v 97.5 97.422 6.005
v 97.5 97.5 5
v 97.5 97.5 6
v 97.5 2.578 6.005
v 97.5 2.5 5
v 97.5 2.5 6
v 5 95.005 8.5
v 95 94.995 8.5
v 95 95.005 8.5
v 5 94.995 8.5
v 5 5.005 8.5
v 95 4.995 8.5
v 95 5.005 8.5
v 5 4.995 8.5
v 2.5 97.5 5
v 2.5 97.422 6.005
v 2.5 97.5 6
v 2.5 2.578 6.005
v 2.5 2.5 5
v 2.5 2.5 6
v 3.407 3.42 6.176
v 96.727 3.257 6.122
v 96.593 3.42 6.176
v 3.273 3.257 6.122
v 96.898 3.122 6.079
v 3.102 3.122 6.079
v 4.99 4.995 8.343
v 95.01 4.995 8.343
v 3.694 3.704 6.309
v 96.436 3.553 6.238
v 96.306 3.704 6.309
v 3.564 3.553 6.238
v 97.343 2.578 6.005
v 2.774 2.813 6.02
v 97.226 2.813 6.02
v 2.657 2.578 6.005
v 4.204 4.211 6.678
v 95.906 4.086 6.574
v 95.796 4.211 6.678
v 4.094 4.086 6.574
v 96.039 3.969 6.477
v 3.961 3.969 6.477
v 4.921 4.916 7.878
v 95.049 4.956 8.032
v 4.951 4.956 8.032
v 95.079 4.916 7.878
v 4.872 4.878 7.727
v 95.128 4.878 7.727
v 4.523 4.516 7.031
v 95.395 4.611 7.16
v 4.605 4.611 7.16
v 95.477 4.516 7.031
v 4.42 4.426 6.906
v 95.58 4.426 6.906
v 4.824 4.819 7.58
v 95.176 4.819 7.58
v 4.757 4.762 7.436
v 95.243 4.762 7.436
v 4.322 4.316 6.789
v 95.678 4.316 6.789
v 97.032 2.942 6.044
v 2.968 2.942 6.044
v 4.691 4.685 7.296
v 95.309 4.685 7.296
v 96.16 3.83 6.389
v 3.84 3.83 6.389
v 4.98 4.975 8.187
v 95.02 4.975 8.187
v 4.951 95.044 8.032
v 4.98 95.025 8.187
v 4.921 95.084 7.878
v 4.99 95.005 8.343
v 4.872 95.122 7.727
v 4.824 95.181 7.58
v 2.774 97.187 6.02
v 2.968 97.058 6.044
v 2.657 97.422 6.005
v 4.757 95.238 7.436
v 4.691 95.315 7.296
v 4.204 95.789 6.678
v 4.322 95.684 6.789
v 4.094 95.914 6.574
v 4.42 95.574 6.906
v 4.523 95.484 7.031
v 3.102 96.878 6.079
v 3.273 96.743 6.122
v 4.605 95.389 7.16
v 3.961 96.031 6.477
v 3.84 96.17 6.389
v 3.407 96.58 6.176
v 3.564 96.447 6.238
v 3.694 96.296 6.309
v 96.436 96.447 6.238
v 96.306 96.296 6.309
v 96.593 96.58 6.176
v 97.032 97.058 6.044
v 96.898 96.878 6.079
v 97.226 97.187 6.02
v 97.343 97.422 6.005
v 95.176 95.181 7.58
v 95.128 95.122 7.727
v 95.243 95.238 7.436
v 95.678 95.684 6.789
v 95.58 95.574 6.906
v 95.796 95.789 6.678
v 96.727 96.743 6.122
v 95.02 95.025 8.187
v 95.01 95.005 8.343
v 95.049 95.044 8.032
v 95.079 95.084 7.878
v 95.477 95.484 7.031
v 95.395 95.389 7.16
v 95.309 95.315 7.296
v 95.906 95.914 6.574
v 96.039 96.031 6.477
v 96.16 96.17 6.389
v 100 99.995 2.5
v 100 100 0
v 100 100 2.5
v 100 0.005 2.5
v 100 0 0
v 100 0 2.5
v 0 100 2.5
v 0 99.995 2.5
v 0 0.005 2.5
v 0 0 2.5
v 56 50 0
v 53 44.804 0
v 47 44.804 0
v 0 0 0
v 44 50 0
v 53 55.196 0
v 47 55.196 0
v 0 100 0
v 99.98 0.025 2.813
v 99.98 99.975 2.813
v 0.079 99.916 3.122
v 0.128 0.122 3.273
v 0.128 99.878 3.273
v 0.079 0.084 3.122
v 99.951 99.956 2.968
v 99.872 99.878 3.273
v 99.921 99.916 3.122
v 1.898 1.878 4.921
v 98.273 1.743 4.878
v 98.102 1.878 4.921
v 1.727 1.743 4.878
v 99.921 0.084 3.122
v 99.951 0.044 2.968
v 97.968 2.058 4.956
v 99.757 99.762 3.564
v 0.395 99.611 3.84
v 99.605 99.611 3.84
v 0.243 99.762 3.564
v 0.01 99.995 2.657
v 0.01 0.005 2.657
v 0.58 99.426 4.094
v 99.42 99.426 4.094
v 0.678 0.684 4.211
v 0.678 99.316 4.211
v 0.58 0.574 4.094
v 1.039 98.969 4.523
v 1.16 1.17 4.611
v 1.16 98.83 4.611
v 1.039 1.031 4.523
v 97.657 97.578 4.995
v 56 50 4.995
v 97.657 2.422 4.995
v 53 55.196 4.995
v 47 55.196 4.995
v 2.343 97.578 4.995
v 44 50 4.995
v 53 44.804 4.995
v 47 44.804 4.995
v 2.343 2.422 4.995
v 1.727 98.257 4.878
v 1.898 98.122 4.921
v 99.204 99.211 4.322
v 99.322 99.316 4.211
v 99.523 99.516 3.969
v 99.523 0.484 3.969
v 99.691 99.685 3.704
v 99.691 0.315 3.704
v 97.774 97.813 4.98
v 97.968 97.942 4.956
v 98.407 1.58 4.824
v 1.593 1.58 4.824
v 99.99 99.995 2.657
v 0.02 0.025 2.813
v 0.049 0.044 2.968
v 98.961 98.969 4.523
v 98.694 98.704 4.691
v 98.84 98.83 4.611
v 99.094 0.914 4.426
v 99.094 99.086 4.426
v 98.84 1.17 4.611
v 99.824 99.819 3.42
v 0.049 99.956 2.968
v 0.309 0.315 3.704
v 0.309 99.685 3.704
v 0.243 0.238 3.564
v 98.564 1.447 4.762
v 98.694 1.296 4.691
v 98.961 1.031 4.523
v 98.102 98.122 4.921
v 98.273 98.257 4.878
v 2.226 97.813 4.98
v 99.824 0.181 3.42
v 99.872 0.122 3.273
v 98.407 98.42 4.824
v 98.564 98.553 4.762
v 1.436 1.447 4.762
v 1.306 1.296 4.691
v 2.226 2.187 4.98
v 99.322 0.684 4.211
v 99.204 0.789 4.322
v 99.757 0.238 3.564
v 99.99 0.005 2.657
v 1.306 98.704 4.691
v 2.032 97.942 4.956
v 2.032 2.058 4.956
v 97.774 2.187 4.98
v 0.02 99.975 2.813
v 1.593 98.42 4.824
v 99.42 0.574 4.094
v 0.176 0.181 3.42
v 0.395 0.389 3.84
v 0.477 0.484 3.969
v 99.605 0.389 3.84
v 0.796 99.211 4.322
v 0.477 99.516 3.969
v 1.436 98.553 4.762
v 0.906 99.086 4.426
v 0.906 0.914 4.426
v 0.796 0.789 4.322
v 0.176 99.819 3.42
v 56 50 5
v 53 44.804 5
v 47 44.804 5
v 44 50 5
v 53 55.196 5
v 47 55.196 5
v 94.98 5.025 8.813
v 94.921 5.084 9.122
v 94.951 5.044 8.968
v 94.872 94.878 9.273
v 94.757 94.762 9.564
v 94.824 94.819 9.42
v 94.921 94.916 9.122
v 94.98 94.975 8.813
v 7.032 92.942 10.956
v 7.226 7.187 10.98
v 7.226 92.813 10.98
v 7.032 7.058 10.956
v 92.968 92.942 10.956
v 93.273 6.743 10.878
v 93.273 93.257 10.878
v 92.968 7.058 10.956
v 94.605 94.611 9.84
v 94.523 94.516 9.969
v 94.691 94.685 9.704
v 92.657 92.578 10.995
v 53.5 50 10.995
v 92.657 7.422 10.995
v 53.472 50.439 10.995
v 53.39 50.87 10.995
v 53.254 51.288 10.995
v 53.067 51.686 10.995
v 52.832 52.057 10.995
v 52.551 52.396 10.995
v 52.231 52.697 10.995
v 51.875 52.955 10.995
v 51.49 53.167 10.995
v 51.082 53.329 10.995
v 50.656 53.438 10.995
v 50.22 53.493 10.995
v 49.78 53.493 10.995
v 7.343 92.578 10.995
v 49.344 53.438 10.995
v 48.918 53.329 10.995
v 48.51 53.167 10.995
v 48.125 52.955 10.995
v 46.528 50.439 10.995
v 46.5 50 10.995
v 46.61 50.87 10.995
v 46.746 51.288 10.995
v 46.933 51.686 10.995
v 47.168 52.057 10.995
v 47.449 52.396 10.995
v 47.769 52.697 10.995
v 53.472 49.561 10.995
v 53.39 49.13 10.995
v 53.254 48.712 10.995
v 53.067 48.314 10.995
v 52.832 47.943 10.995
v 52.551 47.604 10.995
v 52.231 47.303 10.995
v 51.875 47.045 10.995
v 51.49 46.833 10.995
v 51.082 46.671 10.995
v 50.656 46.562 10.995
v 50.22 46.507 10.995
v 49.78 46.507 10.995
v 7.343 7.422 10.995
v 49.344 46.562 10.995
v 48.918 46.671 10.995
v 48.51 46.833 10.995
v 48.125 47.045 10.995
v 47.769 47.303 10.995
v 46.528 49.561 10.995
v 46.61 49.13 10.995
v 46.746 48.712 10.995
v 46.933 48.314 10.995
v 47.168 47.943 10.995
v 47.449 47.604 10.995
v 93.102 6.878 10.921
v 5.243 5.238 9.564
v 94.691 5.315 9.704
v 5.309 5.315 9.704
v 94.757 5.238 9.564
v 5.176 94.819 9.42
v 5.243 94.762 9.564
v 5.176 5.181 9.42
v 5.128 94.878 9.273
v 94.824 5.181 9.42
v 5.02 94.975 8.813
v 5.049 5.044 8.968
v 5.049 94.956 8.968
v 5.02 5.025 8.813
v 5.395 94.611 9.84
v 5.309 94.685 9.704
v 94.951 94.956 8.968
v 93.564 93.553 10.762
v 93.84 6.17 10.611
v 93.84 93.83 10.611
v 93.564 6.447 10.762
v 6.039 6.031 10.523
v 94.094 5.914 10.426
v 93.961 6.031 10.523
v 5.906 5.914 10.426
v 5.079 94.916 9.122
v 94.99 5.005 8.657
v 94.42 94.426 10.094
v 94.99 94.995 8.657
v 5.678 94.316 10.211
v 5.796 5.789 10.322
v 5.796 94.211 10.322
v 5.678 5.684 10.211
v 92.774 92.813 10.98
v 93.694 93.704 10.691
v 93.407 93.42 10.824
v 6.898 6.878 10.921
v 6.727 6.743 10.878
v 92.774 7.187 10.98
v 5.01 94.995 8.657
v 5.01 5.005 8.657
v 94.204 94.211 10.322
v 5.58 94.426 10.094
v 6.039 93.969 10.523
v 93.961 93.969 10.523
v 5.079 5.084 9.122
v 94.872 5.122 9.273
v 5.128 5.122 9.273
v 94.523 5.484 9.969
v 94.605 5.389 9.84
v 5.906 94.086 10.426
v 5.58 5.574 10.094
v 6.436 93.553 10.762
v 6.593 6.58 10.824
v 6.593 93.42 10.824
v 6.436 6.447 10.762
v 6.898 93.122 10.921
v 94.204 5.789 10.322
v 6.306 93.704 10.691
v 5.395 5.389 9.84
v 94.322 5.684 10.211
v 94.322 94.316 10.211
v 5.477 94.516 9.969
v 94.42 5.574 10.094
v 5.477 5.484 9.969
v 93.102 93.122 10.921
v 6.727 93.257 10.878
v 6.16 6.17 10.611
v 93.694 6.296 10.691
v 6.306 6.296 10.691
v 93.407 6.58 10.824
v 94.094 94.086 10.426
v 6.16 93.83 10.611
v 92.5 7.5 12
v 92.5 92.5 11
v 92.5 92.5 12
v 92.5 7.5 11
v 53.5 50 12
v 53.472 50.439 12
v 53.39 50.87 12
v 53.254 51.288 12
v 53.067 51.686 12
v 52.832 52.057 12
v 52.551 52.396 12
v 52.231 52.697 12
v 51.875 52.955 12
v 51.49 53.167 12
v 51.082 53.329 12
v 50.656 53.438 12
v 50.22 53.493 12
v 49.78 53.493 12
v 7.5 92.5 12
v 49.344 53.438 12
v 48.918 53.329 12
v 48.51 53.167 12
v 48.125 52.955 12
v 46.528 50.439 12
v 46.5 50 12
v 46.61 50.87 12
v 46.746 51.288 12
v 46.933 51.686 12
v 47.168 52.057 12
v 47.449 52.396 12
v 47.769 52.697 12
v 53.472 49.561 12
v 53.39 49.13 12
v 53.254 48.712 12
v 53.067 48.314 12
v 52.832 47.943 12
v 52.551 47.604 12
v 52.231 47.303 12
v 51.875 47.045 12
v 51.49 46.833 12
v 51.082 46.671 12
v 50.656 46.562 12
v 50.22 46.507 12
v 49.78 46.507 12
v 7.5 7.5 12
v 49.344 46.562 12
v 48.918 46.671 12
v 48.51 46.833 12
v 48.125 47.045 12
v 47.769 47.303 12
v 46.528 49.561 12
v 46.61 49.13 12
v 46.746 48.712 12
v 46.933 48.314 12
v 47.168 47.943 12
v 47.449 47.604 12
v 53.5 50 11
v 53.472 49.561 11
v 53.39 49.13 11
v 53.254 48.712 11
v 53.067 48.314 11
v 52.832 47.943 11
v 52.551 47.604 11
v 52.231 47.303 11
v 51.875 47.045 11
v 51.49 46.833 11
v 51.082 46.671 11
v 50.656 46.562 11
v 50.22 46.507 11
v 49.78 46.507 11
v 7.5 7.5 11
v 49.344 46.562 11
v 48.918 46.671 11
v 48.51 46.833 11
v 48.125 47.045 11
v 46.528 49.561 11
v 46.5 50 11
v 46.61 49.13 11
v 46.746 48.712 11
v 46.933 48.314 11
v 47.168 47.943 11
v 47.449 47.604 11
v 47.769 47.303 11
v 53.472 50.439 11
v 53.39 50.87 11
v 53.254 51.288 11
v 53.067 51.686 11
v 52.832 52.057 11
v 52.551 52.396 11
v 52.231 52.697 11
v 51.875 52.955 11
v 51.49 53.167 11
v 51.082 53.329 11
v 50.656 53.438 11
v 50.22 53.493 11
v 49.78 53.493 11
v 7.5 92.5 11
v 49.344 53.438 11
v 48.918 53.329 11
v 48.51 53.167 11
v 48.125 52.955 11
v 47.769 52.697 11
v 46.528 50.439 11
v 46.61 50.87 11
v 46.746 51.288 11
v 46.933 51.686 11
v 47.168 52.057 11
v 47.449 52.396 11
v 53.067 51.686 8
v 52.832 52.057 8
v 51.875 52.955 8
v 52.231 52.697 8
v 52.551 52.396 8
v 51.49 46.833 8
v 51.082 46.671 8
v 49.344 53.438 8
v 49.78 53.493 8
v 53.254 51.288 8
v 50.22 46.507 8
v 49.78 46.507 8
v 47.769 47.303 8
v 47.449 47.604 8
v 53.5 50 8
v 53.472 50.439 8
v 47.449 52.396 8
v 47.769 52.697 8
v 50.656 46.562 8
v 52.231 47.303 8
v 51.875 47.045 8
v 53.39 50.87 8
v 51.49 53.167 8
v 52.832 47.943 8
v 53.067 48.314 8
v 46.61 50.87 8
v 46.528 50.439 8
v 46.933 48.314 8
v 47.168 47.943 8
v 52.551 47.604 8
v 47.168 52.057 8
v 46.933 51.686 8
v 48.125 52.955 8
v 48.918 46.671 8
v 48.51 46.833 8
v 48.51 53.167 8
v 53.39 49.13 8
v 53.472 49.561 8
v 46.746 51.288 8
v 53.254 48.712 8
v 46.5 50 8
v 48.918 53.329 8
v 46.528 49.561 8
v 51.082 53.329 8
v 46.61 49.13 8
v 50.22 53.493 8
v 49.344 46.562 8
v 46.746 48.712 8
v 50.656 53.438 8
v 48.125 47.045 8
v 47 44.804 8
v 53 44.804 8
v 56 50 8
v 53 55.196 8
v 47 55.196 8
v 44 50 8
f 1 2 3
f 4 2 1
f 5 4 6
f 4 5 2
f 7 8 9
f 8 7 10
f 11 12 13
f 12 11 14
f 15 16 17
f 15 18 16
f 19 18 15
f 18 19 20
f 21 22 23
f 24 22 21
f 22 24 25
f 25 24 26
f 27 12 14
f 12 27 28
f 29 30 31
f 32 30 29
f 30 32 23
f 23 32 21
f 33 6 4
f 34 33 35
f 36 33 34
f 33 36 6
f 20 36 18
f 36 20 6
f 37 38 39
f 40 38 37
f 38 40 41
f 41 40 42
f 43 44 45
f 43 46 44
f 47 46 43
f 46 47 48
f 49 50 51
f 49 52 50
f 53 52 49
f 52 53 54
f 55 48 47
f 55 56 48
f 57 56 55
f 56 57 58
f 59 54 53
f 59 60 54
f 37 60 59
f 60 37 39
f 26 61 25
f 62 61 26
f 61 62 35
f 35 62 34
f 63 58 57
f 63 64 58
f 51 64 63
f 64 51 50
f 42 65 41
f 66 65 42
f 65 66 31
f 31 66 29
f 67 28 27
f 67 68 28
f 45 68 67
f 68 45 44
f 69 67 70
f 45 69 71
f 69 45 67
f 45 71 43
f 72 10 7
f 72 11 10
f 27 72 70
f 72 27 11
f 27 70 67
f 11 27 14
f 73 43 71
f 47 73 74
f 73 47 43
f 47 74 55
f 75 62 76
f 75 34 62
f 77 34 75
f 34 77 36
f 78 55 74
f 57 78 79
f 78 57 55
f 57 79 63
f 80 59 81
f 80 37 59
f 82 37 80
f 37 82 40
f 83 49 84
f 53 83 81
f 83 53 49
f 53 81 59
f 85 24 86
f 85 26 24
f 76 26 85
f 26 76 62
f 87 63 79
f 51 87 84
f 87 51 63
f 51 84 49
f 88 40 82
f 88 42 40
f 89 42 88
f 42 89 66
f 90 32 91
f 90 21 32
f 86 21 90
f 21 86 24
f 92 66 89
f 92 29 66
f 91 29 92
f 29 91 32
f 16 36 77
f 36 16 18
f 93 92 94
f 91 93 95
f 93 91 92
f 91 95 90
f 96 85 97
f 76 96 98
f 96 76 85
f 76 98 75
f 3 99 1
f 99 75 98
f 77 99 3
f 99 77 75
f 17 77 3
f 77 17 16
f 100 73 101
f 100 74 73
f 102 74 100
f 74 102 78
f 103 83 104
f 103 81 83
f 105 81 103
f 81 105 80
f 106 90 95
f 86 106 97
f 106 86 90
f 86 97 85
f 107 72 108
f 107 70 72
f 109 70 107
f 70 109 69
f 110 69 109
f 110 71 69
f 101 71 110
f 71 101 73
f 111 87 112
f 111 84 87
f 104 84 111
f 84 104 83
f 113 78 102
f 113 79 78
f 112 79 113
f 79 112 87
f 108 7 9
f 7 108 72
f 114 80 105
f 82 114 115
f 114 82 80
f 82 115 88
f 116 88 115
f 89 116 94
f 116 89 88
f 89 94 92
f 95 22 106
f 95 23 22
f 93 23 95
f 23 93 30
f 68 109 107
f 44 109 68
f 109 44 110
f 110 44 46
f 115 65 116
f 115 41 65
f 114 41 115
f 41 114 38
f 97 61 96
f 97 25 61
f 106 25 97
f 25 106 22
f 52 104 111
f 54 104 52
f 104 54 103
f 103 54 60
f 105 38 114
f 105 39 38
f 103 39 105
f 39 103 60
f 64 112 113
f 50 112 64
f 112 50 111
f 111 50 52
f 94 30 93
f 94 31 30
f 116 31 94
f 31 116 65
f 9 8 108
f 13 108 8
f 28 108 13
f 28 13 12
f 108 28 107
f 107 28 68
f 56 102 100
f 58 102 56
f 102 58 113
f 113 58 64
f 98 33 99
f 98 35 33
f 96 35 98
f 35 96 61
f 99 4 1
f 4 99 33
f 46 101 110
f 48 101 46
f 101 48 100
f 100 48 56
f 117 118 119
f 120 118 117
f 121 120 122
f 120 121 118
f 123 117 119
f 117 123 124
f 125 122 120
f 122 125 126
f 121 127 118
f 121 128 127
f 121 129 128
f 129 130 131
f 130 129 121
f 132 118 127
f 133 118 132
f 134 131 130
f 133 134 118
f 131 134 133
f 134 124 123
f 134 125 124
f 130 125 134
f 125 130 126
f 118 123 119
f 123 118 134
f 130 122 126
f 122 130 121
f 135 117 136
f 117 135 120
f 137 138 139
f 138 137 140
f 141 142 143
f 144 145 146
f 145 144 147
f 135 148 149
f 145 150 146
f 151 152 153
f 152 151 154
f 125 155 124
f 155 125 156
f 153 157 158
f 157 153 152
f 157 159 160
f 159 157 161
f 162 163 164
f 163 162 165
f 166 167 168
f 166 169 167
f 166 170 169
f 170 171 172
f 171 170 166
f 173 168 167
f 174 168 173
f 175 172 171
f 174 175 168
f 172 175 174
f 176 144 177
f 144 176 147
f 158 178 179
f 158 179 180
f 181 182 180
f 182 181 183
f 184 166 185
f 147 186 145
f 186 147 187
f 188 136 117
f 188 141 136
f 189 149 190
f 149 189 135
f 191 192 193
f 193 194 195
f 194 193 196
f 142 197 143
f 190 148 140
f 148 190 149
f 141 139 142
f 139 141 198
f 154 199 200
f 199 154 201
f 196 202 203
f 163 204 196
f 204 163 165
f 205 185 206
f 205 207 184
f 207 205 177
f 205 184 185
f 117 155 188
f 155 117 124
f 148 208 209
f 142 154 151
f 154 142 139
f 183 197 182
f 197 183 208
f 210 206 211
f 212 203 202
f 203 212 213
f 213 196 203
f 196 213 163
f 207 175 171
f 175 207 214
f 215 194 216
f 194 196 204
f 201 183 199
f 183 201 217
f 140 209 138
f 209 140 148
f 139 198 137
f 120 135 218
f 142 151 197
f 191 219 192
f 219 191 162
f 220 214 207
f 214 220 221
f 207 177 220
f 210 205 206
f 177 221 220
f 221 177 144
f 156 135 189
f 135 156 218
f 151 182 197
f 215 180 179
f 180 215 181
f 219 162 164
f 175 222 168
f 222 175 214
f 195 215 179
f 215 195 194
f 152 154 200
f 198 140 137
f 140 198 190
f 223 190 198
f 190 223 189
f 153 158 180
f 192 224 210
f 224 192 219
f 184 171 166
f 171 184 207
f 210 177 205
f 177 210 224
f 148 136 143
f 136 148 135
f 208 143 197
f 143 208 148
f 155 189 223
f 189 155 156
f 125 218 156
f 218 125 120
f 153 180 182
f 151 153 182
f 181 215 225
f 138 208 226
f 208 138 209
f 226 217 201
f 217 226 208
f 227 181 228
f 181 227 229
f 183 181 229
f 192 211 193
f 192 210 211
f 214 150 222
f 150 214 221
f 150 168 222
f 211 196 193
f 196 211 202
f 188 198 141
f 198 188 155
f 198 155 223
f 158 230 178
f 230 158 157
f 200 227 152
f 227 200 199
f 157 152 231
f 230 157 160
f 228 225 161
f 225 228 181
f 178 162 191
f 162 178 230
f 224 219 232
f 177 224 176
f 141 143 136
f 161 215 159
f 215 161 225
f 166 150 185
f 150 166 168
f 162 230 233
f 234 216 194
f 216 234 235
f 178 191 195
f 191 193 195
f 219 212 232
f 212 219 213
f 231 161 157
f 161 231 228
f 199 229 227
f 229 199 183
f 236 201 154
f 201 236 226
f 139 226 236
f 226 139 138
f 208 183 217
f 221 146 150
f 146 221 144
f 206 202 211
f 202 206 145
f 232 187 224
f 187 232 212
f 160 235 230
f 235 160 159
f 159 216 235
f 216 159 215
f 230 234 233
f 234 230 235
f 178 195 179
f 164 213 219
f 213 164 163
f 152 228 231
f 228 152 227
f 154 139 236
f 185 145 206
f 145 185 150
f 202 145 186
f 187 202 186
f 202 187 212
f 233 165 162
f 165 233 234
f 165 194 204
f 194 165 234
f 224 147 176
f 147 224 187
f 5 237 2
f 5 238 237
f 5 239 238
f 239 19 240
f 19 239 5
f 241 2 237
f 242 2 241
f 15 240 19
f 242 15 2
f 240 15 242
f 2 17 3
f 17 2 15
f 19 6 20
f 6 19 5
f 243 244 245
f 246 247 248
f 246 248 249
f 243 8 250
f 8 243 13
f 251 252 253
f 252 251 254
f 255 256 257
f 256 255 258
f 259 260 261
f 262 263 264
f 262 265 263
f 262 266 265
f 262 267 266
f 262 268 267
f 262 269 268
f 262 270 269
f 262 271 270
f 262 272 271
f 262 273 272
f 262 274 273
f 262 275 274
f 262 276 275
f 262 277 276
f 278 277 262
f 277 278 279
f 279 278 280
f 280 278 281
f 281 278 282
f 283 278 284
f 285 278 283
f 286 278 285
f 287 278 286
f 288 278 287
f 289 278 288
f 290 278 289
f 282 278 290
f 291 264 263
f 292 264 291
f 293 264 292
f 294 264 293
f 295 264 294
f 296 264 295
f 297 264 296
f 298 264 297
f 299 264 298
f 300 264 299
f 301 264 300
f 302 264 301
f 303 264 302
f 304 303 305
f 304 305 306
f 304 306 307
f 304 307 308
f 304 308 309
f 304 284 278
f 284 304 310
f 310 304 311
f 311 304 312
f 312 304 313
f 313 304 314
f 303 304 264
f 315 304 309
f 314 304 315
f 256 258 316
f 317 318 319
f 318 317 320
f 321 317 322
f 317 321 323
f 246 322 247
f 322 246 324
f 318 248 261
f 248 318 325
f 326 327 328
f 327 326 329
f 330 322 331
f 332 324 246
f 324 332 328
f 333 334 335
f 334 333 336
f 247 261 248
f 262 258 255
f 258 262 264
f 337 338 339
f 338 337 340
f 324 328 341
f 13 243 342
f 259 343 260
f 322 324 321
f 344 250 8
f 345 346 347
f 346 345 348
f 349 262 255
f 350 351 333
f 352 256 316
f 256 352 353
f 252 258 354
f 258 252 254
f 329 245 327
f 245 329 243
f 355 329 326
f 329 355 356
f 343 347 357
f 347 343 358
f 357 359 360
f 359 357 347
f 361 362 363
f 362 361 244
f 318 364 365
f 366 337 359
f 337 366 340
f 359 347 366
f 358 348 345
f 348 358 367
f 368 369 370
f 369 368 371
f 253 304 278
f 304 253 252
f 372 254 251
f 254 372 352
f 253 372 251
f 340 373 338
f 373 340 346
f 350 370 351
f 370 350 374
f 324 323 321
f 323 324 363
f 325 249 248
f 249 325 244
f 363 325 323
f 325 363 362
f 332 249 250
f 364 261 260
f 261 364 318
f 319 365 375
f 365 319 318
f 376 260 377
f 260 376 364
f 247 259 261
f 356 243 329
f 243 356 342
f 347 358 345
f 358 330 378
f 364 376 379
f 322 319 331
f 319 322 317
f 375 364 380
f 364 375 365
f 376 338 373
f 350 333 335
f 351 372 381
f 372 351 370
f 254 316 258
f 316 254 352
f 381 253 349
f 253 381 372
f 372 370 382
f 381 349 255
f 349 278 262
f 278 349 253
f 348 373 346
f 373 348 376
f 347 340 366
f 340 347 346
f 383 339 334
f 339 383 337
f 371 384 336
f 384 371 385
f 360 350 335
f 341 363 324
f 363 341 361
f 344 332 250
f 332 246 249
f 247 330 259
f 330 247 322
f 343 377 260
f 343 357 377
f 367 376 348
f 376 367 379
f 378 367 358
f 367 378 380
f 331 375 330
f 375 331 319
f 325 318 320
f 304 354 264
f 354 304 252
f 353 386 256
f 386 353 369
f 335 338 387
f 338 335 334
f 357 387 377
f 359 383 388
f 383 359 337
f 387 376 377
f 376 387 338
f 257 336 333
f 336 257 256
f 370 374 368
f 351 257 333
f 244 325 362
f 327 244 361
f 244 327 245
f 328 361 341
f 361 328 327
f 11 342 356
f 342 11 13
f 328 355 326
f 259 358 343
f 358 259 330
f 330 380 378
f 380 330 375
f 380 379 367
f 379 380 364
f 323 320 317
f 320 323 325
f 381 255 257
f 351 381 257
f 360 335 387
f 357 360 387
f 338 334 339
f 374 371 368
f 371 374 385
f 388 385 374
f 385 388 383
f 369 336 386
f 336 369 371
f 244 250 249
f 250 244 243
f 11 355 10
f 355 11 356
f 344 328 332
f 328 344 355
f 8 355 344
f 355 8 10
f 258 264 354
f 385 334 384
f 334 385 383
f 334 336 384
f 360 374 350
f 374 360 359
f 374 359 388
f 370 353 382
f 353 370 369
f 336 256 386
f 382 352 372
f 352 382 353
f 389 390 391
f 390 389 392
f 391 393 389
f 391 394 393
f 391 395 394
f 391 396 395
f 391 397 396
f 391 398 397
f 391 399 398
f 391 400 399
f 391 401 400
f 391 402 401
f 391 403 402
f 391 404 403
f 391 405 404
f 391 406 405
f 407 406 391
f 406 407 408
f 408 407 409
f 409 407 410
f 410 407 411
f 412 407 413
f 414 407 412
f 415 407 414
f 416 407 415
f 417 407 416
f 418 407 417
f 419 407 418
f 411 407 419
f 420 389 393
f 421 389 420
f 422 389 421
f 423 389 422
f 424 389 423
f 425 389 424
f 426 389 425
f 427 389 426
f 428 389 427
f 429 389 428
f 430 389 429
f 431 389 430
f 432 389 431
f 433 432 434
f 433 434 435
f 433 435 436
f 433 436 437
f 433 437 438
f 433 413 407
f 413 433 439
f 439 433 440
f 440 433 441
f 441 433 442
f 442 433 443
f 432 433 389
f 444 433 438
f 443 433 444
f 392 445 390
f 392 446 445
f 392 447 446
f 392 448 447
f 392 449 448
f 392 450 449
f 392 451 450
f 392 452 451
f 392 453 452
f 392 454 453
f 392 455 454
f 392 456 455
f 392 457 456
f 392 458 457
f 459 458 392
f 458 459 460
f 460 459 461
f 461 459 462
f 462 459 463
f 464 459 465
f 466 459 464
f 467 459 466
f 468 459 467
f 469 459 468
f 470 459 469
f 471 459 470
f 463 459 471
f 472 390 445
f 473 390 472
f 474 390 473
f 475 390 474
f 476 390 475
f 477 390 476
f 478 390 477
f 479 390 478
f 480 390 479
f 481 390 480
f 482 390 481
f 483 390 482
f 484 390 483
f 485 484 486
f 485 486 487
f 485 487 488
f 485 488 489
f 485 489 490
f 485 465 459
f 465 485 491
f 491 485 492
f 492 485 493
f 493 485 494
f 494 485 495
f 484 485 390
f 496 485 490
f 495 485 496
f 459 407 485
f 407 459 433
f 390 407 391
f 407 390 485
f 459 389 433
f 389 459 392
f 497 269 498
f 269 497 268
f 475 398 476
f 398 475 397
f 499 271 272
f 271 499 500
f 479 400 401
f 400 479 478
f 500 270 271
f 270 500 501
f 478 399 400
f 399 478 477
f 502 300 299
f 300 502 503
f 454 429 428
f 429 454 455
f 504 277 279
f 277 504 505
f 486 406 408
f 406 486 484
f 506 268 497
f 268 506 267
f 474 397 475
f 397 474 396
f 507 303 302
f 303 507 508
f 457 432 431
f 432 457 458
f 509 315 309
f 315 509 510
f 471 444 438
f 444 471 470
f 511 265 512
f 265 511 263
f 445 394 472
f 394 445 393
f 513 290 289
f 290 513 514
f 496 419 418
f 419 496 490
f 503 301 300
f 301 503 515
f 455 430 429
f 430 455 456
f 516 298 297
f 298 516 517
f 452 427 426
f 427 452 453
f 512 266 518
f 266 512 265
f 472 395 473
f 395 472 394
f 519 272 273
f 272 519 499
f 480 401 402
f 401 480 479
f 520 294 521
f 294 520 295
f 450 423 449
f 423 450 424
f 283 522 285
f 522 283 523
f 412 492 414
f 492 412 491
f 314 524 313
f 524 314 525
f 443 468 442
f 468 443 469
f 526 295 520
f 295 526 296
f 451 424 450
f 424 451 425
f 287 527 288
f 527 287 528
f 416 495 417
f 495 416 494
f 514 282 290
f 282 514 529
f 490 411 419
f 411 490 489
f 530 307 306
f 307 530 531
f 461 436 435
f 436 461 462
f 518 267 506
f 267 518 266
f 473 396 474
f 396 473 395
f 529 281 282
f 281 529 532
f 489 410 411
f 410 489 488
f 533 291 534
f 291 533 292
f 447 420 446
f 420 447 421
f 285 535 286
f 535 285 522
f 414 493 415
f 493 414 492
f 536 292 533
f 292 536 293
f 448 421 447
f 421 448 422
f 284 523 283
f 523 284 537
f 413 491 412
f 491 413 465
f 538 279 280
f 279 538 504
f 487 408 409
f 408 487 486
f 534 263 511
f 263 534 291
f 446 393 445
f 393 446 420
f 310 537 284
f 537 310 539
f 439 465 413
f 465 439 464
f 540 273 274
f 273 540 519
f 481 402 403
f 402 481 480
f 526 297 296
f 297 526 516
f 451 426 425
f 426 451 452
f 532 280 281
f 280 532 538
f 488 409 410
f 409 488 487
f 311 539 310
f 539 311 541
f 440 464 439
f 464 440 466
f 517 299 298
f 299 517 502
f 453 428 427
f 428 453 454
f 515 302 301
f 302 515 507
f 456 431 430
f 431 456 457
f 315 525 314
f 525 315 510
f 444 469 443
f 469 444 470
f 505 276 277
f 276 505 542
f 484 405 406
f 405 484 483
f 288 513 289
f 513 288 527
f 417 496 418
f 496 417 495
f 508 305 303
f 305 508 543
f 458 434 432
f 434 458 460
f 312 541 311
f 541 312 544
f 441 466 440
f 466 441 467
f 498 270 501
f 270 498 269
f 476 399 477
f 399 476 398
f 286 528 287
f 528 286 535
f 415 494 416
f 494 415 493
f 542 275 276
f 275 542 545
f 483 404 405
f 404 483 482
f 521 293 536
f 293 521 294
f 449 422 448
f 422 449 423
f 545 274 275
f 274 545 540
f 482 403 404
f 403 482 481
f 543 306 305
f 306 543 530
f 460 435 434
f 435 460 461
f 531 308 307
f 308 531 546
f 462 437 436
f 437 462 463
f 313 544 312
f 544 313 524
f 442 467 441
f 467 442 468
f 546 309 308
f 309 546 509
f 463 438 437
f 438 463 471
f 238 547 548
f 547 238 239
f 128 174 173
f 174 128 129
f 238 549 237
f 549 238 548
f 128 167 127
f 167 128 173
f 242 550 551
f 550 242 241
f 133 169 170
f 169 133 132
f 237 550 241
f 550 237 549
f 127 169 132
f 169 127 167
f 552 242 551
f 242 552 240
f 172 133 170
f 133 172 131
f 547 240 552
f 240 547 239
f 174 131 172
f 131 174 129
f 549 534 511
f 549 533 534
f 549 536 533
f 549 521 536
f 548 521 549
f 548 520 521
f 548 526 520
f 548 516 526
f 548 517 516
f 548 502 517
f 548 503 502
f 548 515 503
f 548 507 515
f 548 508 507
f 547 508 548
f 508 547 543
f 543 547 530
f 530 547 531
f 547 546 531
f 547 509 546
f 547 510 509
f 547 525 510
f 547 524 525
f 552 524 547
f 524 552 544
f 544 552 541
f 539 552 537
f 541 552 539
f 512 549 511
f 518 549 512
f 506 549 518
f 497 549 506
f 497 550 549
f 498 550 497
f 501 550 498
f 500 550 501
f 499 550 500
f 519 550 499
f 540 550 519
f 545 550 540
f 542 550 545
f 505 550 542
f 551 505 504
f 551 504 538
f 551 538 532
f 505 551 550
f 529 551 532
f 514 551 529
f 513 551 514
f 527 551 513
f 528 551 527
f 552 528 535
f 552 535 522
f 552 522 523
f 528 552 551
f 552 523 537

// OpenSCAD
/*[Base Dimensions]*/
width = 100; //[20:400]
depth = 100; //[20:400]

/*[Mounting Hole]*/
hole_x_offset = 0; //[-300:300]
hole_y_offset = 0; //[-300:300]
hole_diameter = 7; //[0:12]
hex_diameter = 12; //[0:20]

/*[Hidden]*/
$fn=50;
height = 10;

difference(){
union(){
    //base layer
    cube([width,depth,height/4]);

    //rounded layer
    hull(){
        intersection(){
            translate([0,2.5,2.5]){
                rotate([0,90,0]){
                    cylinder(h=width,d=5);
                }
            }
            translate([2.5,0,2.5]){
                rotate([-90,0,0]){
                    cylinder(h=depth,d=5);
                }
            }
        }
        intersection(){
            translate([0,depth-2.5,2.5]){
                rotate([0,90,0]){
                    cylinder(h=width,d=5);
                }
            }
            translate([width-2.5,0,2.5]){
                rotate([-90,0,0]){
                    cylinder(h=depth,d=5);
                }
            }
        }
        intersection(){
            translate([0,2.5,2.5]){
                rotate([0,90,0]){
                    cylinder(h=width,d=5);
                }
            }
            translate([width-2.5,0,2.5]){
                rotate([-90,0,0]){
                    cylinder(h=depth,d=5);
                }
            }
        }
        intersection(){
            translate([2.5,0,2.5]){
                rotate([-90,0,0]){
                    cylinder(h=depth,d=5);
                }
            }
            translate([0,depth-2.5,2.5]){
                rotate([0,90,0]){
                    cylinder(h=width,d=5);
                }
            }
        }
    }

    //step layer
    translate([2.5, 2.5, 5]){
        cube([width-5,depth-5,1]);
    }

    //inverted rounded layer
    intersection(){
        difference(){
            translate([2.5,2.5,6]){
                    cube([width-5,5,2.5]);
            }
            translate([2.5,2.5,8.5]){
                rotate([0,90,0]){
                    cylinder(h=width-5,d=5);
                }
            }
        }
        difference(){
            translate([2.5,2.5,6]){
                cube([5,depth-5,2.5]);
            }
            translate([2.5,2.5,8.5]){
                rotate([-90,0,0]){
                    cylinder(h=depth-5,d=5);
                }
            }
        }
    }
    intersection(){
        difference(){
            translate([2.5,depth-5-2.5,6]){
                    cube([width-5,5,2.5]);
            }
            translate([2.5,depth-5+2.5,8.5]){
                rotate([0,90,0]){
                    cylinder(h=width-5,d=5);
                }
            }
        }
        difference(){
            translate([width-5-2.5,2.5,6]){
                cube([5,depth-5,2.5]);
            }
            translate([width-5+2.5,2.5,8.5]){
                rotate([-90,0,0]){
                    cylinder(h=depth-5,d=5);
                }
            }
        }
    }
    intersection(){
        difference(){
            translate([2.5,depth-5-2.5,6]){
                    cube([width-5,5,2.5]);
            }
            translate([2.5,depth-5+2.5,8.5]){
                rotate([0,90,0]){
                    cylinder(h=width-5,d=5);
                }
            }
        }
        difference(){
            translate([2.5,2.5,6]){
                cube([5,depth-5,2.5]);
            }
            translate([2.5,2.5,8.5]){
                rotate([-90,0,0]){
                    cylinder(h=depth-5,d=5);
                }
            }
        }
    }
    intersection(){
        difference(){
            translate([2.5,2.5,6]){
                    cube([width-5,5,2.5]);
            }
            translate([2.5,2.5,8.5]){
                rotate([0,90,0]){
                    cylinder(h=width-5,d=5);
                }
            }
        }
        difference(){
            translate([width-5-2.5,2.5,6]){
                cube([5,depth-5,2.5]);
            }
            translate([width-5+2.5,2.5,8.5]){
                rotate([-90,0,0]){
                    cylinder(h=depth-5,d=5);
                }
            }
        }
    }
    translate([5,5,6]){
        cube([width-10,depth-10,2.5]);
    }
    difference(){
        translate([5,2.5,6]){
            cube([width-10,5,2.5]);
        }
        translate([5,2.5,8.5]){
            rotate([0,90,0]){
                cylinder(h=width-10,d=5);
            }
        }
    }
    difference(){
        translate([2.5,5,6]){
            cube([5,depth-10,2.5]);
        }
        translate([2.5,5,8.5]){
            rotate([-90,0,0]){
                cylinder(h=depth-10,d=5);
            }
        }
    }
    difference(){
        translate([5,depth-5-2.5,6]){
            cube([width-10,5,2.5]);
        }
        translate([5,depth-2.5,8.5]){
            rotate([0,90,0]){
                cylinder(h=width-10,d=5);
            }
        }
    }
    difference(){
        translate([width-5-2.5,5,6]){
            cube([5,depth-10,2.5]);
        }
        translate([width-2.5,5,8.5]){
            rotate([-90,0,0]){
                cylinder(h=depth-10,d=5);
            }
        }
    }
    intersection(){
        difference(){
            translate([2.5,depth-5-2.5,6]){
                    cube([width-5,5,2.5]);
            }
            translate([2.5,depth-5+2.5,8.5]){
                rotate([0,90,0]){
                    cylinder(h=width-5,d=5);
                }
            }
        }
        difference(){
            translate([width-5-2.5,2.5,6]){
                cube([5,depth-5,2.5]);
            }
            translate([width-5+2.5,2.5,8.5]){
                rotate([-90,0,0]){
                    cylinder(h=depth-5,d=5);
                }
            }
        }
    }
    intersection(){
        difference(){
            translate([2.5,depth-5-2.5,6]){
                    cube([width-5,5,2.5]);
            }
            translate([2.5,depth-5+2.5,8.5]){
                rotate([0,90,0]){
                    cylinder(h=width-5,d=5);
                }
            }
        }
        difference(){
            translate([2.5,2.5,6]){
                cube([5,depth-5,2.5]);
            }
            translate([2.5,2.5,8.5]){
                rotate([-90,0,0]){
                    cylinder(h=depth-5,d=5);
                }
            }
        }
    }
    intersection(){
        difference(){
            translate([2.5,2.5,6]){
                    cube([width-5,5,2.5]);
            }
            translate([2.5,2.5,8.5]){
                rotate([0,90,0]){
                    cylinder(h=width-5,d=5);
                }
            }
        }
        difference(){
            translate([width-5-2.5,2.5,6]){
                cube([5,depth-5,2.5]);
            }
            translate([width-5+2.5,2.5,8.5]){
                rotate([-90,0,0]){
                    cylinder(h=depth-5,d=5);
                }
            }
        }
    }

    //second rounder layer
    translate([5,5,6]){
        hull(){
            intersection(){
                translate([0,2.5,2.5]){
                    rotate([0,90,0]){
                        cylinder(h=width,d=5);
                    }
                }
                translate([2.5,0,2.5]){
                    rotate([-90,0,0]){
                        cylinder(h=depth,d=5);
                    }
                }
            }
            intersection(){
                translate([0,depth-10-2.5,2.5]){
                    rotate([0,90,0]){
                        cylinder(h=width,d=5);
                    }
                }
                translate([width-10-2.5,0,2.5]){
                    rotate([-90,0,0]){
                        cylinder(h=depth,d=5);
                    }
                }
            }
            intersection(){
                translate([0,2.5,2.5]){
                    rotate([0,90,0]){
                        cylinder(h=width,d=5);
                    }
                }
                translate([width-10-2.5,0,2.5]){
                    rotate([-90,0,0]){
                        cylinder(h=depth,d=5);
                    }
                }
            }
            intersection(){
                translate([2.5,0,2.5]){
                    rotate([-90,0,0]){
                        cylinder(h=depth,d=5);
                    }
                }
                translate([0,depth-10-2.5,2.5]){
                    rotate([0,90,0]){
                        cylinder(h=width,d=5);
                    }
                }
            }
        }
    }

    //top step
    translate([7.5,7.5,11]){
        cube([width-15,depth-15,1]);
    }
}
translate([width/2+hole_x_offset,depth/2+hole_y_offset,-1]){
    union(){
        cylinder(h=15,d=hole_diameter);
        cylinder(h=9,d=hex_diameter,$fn=6);
    }
}
}
